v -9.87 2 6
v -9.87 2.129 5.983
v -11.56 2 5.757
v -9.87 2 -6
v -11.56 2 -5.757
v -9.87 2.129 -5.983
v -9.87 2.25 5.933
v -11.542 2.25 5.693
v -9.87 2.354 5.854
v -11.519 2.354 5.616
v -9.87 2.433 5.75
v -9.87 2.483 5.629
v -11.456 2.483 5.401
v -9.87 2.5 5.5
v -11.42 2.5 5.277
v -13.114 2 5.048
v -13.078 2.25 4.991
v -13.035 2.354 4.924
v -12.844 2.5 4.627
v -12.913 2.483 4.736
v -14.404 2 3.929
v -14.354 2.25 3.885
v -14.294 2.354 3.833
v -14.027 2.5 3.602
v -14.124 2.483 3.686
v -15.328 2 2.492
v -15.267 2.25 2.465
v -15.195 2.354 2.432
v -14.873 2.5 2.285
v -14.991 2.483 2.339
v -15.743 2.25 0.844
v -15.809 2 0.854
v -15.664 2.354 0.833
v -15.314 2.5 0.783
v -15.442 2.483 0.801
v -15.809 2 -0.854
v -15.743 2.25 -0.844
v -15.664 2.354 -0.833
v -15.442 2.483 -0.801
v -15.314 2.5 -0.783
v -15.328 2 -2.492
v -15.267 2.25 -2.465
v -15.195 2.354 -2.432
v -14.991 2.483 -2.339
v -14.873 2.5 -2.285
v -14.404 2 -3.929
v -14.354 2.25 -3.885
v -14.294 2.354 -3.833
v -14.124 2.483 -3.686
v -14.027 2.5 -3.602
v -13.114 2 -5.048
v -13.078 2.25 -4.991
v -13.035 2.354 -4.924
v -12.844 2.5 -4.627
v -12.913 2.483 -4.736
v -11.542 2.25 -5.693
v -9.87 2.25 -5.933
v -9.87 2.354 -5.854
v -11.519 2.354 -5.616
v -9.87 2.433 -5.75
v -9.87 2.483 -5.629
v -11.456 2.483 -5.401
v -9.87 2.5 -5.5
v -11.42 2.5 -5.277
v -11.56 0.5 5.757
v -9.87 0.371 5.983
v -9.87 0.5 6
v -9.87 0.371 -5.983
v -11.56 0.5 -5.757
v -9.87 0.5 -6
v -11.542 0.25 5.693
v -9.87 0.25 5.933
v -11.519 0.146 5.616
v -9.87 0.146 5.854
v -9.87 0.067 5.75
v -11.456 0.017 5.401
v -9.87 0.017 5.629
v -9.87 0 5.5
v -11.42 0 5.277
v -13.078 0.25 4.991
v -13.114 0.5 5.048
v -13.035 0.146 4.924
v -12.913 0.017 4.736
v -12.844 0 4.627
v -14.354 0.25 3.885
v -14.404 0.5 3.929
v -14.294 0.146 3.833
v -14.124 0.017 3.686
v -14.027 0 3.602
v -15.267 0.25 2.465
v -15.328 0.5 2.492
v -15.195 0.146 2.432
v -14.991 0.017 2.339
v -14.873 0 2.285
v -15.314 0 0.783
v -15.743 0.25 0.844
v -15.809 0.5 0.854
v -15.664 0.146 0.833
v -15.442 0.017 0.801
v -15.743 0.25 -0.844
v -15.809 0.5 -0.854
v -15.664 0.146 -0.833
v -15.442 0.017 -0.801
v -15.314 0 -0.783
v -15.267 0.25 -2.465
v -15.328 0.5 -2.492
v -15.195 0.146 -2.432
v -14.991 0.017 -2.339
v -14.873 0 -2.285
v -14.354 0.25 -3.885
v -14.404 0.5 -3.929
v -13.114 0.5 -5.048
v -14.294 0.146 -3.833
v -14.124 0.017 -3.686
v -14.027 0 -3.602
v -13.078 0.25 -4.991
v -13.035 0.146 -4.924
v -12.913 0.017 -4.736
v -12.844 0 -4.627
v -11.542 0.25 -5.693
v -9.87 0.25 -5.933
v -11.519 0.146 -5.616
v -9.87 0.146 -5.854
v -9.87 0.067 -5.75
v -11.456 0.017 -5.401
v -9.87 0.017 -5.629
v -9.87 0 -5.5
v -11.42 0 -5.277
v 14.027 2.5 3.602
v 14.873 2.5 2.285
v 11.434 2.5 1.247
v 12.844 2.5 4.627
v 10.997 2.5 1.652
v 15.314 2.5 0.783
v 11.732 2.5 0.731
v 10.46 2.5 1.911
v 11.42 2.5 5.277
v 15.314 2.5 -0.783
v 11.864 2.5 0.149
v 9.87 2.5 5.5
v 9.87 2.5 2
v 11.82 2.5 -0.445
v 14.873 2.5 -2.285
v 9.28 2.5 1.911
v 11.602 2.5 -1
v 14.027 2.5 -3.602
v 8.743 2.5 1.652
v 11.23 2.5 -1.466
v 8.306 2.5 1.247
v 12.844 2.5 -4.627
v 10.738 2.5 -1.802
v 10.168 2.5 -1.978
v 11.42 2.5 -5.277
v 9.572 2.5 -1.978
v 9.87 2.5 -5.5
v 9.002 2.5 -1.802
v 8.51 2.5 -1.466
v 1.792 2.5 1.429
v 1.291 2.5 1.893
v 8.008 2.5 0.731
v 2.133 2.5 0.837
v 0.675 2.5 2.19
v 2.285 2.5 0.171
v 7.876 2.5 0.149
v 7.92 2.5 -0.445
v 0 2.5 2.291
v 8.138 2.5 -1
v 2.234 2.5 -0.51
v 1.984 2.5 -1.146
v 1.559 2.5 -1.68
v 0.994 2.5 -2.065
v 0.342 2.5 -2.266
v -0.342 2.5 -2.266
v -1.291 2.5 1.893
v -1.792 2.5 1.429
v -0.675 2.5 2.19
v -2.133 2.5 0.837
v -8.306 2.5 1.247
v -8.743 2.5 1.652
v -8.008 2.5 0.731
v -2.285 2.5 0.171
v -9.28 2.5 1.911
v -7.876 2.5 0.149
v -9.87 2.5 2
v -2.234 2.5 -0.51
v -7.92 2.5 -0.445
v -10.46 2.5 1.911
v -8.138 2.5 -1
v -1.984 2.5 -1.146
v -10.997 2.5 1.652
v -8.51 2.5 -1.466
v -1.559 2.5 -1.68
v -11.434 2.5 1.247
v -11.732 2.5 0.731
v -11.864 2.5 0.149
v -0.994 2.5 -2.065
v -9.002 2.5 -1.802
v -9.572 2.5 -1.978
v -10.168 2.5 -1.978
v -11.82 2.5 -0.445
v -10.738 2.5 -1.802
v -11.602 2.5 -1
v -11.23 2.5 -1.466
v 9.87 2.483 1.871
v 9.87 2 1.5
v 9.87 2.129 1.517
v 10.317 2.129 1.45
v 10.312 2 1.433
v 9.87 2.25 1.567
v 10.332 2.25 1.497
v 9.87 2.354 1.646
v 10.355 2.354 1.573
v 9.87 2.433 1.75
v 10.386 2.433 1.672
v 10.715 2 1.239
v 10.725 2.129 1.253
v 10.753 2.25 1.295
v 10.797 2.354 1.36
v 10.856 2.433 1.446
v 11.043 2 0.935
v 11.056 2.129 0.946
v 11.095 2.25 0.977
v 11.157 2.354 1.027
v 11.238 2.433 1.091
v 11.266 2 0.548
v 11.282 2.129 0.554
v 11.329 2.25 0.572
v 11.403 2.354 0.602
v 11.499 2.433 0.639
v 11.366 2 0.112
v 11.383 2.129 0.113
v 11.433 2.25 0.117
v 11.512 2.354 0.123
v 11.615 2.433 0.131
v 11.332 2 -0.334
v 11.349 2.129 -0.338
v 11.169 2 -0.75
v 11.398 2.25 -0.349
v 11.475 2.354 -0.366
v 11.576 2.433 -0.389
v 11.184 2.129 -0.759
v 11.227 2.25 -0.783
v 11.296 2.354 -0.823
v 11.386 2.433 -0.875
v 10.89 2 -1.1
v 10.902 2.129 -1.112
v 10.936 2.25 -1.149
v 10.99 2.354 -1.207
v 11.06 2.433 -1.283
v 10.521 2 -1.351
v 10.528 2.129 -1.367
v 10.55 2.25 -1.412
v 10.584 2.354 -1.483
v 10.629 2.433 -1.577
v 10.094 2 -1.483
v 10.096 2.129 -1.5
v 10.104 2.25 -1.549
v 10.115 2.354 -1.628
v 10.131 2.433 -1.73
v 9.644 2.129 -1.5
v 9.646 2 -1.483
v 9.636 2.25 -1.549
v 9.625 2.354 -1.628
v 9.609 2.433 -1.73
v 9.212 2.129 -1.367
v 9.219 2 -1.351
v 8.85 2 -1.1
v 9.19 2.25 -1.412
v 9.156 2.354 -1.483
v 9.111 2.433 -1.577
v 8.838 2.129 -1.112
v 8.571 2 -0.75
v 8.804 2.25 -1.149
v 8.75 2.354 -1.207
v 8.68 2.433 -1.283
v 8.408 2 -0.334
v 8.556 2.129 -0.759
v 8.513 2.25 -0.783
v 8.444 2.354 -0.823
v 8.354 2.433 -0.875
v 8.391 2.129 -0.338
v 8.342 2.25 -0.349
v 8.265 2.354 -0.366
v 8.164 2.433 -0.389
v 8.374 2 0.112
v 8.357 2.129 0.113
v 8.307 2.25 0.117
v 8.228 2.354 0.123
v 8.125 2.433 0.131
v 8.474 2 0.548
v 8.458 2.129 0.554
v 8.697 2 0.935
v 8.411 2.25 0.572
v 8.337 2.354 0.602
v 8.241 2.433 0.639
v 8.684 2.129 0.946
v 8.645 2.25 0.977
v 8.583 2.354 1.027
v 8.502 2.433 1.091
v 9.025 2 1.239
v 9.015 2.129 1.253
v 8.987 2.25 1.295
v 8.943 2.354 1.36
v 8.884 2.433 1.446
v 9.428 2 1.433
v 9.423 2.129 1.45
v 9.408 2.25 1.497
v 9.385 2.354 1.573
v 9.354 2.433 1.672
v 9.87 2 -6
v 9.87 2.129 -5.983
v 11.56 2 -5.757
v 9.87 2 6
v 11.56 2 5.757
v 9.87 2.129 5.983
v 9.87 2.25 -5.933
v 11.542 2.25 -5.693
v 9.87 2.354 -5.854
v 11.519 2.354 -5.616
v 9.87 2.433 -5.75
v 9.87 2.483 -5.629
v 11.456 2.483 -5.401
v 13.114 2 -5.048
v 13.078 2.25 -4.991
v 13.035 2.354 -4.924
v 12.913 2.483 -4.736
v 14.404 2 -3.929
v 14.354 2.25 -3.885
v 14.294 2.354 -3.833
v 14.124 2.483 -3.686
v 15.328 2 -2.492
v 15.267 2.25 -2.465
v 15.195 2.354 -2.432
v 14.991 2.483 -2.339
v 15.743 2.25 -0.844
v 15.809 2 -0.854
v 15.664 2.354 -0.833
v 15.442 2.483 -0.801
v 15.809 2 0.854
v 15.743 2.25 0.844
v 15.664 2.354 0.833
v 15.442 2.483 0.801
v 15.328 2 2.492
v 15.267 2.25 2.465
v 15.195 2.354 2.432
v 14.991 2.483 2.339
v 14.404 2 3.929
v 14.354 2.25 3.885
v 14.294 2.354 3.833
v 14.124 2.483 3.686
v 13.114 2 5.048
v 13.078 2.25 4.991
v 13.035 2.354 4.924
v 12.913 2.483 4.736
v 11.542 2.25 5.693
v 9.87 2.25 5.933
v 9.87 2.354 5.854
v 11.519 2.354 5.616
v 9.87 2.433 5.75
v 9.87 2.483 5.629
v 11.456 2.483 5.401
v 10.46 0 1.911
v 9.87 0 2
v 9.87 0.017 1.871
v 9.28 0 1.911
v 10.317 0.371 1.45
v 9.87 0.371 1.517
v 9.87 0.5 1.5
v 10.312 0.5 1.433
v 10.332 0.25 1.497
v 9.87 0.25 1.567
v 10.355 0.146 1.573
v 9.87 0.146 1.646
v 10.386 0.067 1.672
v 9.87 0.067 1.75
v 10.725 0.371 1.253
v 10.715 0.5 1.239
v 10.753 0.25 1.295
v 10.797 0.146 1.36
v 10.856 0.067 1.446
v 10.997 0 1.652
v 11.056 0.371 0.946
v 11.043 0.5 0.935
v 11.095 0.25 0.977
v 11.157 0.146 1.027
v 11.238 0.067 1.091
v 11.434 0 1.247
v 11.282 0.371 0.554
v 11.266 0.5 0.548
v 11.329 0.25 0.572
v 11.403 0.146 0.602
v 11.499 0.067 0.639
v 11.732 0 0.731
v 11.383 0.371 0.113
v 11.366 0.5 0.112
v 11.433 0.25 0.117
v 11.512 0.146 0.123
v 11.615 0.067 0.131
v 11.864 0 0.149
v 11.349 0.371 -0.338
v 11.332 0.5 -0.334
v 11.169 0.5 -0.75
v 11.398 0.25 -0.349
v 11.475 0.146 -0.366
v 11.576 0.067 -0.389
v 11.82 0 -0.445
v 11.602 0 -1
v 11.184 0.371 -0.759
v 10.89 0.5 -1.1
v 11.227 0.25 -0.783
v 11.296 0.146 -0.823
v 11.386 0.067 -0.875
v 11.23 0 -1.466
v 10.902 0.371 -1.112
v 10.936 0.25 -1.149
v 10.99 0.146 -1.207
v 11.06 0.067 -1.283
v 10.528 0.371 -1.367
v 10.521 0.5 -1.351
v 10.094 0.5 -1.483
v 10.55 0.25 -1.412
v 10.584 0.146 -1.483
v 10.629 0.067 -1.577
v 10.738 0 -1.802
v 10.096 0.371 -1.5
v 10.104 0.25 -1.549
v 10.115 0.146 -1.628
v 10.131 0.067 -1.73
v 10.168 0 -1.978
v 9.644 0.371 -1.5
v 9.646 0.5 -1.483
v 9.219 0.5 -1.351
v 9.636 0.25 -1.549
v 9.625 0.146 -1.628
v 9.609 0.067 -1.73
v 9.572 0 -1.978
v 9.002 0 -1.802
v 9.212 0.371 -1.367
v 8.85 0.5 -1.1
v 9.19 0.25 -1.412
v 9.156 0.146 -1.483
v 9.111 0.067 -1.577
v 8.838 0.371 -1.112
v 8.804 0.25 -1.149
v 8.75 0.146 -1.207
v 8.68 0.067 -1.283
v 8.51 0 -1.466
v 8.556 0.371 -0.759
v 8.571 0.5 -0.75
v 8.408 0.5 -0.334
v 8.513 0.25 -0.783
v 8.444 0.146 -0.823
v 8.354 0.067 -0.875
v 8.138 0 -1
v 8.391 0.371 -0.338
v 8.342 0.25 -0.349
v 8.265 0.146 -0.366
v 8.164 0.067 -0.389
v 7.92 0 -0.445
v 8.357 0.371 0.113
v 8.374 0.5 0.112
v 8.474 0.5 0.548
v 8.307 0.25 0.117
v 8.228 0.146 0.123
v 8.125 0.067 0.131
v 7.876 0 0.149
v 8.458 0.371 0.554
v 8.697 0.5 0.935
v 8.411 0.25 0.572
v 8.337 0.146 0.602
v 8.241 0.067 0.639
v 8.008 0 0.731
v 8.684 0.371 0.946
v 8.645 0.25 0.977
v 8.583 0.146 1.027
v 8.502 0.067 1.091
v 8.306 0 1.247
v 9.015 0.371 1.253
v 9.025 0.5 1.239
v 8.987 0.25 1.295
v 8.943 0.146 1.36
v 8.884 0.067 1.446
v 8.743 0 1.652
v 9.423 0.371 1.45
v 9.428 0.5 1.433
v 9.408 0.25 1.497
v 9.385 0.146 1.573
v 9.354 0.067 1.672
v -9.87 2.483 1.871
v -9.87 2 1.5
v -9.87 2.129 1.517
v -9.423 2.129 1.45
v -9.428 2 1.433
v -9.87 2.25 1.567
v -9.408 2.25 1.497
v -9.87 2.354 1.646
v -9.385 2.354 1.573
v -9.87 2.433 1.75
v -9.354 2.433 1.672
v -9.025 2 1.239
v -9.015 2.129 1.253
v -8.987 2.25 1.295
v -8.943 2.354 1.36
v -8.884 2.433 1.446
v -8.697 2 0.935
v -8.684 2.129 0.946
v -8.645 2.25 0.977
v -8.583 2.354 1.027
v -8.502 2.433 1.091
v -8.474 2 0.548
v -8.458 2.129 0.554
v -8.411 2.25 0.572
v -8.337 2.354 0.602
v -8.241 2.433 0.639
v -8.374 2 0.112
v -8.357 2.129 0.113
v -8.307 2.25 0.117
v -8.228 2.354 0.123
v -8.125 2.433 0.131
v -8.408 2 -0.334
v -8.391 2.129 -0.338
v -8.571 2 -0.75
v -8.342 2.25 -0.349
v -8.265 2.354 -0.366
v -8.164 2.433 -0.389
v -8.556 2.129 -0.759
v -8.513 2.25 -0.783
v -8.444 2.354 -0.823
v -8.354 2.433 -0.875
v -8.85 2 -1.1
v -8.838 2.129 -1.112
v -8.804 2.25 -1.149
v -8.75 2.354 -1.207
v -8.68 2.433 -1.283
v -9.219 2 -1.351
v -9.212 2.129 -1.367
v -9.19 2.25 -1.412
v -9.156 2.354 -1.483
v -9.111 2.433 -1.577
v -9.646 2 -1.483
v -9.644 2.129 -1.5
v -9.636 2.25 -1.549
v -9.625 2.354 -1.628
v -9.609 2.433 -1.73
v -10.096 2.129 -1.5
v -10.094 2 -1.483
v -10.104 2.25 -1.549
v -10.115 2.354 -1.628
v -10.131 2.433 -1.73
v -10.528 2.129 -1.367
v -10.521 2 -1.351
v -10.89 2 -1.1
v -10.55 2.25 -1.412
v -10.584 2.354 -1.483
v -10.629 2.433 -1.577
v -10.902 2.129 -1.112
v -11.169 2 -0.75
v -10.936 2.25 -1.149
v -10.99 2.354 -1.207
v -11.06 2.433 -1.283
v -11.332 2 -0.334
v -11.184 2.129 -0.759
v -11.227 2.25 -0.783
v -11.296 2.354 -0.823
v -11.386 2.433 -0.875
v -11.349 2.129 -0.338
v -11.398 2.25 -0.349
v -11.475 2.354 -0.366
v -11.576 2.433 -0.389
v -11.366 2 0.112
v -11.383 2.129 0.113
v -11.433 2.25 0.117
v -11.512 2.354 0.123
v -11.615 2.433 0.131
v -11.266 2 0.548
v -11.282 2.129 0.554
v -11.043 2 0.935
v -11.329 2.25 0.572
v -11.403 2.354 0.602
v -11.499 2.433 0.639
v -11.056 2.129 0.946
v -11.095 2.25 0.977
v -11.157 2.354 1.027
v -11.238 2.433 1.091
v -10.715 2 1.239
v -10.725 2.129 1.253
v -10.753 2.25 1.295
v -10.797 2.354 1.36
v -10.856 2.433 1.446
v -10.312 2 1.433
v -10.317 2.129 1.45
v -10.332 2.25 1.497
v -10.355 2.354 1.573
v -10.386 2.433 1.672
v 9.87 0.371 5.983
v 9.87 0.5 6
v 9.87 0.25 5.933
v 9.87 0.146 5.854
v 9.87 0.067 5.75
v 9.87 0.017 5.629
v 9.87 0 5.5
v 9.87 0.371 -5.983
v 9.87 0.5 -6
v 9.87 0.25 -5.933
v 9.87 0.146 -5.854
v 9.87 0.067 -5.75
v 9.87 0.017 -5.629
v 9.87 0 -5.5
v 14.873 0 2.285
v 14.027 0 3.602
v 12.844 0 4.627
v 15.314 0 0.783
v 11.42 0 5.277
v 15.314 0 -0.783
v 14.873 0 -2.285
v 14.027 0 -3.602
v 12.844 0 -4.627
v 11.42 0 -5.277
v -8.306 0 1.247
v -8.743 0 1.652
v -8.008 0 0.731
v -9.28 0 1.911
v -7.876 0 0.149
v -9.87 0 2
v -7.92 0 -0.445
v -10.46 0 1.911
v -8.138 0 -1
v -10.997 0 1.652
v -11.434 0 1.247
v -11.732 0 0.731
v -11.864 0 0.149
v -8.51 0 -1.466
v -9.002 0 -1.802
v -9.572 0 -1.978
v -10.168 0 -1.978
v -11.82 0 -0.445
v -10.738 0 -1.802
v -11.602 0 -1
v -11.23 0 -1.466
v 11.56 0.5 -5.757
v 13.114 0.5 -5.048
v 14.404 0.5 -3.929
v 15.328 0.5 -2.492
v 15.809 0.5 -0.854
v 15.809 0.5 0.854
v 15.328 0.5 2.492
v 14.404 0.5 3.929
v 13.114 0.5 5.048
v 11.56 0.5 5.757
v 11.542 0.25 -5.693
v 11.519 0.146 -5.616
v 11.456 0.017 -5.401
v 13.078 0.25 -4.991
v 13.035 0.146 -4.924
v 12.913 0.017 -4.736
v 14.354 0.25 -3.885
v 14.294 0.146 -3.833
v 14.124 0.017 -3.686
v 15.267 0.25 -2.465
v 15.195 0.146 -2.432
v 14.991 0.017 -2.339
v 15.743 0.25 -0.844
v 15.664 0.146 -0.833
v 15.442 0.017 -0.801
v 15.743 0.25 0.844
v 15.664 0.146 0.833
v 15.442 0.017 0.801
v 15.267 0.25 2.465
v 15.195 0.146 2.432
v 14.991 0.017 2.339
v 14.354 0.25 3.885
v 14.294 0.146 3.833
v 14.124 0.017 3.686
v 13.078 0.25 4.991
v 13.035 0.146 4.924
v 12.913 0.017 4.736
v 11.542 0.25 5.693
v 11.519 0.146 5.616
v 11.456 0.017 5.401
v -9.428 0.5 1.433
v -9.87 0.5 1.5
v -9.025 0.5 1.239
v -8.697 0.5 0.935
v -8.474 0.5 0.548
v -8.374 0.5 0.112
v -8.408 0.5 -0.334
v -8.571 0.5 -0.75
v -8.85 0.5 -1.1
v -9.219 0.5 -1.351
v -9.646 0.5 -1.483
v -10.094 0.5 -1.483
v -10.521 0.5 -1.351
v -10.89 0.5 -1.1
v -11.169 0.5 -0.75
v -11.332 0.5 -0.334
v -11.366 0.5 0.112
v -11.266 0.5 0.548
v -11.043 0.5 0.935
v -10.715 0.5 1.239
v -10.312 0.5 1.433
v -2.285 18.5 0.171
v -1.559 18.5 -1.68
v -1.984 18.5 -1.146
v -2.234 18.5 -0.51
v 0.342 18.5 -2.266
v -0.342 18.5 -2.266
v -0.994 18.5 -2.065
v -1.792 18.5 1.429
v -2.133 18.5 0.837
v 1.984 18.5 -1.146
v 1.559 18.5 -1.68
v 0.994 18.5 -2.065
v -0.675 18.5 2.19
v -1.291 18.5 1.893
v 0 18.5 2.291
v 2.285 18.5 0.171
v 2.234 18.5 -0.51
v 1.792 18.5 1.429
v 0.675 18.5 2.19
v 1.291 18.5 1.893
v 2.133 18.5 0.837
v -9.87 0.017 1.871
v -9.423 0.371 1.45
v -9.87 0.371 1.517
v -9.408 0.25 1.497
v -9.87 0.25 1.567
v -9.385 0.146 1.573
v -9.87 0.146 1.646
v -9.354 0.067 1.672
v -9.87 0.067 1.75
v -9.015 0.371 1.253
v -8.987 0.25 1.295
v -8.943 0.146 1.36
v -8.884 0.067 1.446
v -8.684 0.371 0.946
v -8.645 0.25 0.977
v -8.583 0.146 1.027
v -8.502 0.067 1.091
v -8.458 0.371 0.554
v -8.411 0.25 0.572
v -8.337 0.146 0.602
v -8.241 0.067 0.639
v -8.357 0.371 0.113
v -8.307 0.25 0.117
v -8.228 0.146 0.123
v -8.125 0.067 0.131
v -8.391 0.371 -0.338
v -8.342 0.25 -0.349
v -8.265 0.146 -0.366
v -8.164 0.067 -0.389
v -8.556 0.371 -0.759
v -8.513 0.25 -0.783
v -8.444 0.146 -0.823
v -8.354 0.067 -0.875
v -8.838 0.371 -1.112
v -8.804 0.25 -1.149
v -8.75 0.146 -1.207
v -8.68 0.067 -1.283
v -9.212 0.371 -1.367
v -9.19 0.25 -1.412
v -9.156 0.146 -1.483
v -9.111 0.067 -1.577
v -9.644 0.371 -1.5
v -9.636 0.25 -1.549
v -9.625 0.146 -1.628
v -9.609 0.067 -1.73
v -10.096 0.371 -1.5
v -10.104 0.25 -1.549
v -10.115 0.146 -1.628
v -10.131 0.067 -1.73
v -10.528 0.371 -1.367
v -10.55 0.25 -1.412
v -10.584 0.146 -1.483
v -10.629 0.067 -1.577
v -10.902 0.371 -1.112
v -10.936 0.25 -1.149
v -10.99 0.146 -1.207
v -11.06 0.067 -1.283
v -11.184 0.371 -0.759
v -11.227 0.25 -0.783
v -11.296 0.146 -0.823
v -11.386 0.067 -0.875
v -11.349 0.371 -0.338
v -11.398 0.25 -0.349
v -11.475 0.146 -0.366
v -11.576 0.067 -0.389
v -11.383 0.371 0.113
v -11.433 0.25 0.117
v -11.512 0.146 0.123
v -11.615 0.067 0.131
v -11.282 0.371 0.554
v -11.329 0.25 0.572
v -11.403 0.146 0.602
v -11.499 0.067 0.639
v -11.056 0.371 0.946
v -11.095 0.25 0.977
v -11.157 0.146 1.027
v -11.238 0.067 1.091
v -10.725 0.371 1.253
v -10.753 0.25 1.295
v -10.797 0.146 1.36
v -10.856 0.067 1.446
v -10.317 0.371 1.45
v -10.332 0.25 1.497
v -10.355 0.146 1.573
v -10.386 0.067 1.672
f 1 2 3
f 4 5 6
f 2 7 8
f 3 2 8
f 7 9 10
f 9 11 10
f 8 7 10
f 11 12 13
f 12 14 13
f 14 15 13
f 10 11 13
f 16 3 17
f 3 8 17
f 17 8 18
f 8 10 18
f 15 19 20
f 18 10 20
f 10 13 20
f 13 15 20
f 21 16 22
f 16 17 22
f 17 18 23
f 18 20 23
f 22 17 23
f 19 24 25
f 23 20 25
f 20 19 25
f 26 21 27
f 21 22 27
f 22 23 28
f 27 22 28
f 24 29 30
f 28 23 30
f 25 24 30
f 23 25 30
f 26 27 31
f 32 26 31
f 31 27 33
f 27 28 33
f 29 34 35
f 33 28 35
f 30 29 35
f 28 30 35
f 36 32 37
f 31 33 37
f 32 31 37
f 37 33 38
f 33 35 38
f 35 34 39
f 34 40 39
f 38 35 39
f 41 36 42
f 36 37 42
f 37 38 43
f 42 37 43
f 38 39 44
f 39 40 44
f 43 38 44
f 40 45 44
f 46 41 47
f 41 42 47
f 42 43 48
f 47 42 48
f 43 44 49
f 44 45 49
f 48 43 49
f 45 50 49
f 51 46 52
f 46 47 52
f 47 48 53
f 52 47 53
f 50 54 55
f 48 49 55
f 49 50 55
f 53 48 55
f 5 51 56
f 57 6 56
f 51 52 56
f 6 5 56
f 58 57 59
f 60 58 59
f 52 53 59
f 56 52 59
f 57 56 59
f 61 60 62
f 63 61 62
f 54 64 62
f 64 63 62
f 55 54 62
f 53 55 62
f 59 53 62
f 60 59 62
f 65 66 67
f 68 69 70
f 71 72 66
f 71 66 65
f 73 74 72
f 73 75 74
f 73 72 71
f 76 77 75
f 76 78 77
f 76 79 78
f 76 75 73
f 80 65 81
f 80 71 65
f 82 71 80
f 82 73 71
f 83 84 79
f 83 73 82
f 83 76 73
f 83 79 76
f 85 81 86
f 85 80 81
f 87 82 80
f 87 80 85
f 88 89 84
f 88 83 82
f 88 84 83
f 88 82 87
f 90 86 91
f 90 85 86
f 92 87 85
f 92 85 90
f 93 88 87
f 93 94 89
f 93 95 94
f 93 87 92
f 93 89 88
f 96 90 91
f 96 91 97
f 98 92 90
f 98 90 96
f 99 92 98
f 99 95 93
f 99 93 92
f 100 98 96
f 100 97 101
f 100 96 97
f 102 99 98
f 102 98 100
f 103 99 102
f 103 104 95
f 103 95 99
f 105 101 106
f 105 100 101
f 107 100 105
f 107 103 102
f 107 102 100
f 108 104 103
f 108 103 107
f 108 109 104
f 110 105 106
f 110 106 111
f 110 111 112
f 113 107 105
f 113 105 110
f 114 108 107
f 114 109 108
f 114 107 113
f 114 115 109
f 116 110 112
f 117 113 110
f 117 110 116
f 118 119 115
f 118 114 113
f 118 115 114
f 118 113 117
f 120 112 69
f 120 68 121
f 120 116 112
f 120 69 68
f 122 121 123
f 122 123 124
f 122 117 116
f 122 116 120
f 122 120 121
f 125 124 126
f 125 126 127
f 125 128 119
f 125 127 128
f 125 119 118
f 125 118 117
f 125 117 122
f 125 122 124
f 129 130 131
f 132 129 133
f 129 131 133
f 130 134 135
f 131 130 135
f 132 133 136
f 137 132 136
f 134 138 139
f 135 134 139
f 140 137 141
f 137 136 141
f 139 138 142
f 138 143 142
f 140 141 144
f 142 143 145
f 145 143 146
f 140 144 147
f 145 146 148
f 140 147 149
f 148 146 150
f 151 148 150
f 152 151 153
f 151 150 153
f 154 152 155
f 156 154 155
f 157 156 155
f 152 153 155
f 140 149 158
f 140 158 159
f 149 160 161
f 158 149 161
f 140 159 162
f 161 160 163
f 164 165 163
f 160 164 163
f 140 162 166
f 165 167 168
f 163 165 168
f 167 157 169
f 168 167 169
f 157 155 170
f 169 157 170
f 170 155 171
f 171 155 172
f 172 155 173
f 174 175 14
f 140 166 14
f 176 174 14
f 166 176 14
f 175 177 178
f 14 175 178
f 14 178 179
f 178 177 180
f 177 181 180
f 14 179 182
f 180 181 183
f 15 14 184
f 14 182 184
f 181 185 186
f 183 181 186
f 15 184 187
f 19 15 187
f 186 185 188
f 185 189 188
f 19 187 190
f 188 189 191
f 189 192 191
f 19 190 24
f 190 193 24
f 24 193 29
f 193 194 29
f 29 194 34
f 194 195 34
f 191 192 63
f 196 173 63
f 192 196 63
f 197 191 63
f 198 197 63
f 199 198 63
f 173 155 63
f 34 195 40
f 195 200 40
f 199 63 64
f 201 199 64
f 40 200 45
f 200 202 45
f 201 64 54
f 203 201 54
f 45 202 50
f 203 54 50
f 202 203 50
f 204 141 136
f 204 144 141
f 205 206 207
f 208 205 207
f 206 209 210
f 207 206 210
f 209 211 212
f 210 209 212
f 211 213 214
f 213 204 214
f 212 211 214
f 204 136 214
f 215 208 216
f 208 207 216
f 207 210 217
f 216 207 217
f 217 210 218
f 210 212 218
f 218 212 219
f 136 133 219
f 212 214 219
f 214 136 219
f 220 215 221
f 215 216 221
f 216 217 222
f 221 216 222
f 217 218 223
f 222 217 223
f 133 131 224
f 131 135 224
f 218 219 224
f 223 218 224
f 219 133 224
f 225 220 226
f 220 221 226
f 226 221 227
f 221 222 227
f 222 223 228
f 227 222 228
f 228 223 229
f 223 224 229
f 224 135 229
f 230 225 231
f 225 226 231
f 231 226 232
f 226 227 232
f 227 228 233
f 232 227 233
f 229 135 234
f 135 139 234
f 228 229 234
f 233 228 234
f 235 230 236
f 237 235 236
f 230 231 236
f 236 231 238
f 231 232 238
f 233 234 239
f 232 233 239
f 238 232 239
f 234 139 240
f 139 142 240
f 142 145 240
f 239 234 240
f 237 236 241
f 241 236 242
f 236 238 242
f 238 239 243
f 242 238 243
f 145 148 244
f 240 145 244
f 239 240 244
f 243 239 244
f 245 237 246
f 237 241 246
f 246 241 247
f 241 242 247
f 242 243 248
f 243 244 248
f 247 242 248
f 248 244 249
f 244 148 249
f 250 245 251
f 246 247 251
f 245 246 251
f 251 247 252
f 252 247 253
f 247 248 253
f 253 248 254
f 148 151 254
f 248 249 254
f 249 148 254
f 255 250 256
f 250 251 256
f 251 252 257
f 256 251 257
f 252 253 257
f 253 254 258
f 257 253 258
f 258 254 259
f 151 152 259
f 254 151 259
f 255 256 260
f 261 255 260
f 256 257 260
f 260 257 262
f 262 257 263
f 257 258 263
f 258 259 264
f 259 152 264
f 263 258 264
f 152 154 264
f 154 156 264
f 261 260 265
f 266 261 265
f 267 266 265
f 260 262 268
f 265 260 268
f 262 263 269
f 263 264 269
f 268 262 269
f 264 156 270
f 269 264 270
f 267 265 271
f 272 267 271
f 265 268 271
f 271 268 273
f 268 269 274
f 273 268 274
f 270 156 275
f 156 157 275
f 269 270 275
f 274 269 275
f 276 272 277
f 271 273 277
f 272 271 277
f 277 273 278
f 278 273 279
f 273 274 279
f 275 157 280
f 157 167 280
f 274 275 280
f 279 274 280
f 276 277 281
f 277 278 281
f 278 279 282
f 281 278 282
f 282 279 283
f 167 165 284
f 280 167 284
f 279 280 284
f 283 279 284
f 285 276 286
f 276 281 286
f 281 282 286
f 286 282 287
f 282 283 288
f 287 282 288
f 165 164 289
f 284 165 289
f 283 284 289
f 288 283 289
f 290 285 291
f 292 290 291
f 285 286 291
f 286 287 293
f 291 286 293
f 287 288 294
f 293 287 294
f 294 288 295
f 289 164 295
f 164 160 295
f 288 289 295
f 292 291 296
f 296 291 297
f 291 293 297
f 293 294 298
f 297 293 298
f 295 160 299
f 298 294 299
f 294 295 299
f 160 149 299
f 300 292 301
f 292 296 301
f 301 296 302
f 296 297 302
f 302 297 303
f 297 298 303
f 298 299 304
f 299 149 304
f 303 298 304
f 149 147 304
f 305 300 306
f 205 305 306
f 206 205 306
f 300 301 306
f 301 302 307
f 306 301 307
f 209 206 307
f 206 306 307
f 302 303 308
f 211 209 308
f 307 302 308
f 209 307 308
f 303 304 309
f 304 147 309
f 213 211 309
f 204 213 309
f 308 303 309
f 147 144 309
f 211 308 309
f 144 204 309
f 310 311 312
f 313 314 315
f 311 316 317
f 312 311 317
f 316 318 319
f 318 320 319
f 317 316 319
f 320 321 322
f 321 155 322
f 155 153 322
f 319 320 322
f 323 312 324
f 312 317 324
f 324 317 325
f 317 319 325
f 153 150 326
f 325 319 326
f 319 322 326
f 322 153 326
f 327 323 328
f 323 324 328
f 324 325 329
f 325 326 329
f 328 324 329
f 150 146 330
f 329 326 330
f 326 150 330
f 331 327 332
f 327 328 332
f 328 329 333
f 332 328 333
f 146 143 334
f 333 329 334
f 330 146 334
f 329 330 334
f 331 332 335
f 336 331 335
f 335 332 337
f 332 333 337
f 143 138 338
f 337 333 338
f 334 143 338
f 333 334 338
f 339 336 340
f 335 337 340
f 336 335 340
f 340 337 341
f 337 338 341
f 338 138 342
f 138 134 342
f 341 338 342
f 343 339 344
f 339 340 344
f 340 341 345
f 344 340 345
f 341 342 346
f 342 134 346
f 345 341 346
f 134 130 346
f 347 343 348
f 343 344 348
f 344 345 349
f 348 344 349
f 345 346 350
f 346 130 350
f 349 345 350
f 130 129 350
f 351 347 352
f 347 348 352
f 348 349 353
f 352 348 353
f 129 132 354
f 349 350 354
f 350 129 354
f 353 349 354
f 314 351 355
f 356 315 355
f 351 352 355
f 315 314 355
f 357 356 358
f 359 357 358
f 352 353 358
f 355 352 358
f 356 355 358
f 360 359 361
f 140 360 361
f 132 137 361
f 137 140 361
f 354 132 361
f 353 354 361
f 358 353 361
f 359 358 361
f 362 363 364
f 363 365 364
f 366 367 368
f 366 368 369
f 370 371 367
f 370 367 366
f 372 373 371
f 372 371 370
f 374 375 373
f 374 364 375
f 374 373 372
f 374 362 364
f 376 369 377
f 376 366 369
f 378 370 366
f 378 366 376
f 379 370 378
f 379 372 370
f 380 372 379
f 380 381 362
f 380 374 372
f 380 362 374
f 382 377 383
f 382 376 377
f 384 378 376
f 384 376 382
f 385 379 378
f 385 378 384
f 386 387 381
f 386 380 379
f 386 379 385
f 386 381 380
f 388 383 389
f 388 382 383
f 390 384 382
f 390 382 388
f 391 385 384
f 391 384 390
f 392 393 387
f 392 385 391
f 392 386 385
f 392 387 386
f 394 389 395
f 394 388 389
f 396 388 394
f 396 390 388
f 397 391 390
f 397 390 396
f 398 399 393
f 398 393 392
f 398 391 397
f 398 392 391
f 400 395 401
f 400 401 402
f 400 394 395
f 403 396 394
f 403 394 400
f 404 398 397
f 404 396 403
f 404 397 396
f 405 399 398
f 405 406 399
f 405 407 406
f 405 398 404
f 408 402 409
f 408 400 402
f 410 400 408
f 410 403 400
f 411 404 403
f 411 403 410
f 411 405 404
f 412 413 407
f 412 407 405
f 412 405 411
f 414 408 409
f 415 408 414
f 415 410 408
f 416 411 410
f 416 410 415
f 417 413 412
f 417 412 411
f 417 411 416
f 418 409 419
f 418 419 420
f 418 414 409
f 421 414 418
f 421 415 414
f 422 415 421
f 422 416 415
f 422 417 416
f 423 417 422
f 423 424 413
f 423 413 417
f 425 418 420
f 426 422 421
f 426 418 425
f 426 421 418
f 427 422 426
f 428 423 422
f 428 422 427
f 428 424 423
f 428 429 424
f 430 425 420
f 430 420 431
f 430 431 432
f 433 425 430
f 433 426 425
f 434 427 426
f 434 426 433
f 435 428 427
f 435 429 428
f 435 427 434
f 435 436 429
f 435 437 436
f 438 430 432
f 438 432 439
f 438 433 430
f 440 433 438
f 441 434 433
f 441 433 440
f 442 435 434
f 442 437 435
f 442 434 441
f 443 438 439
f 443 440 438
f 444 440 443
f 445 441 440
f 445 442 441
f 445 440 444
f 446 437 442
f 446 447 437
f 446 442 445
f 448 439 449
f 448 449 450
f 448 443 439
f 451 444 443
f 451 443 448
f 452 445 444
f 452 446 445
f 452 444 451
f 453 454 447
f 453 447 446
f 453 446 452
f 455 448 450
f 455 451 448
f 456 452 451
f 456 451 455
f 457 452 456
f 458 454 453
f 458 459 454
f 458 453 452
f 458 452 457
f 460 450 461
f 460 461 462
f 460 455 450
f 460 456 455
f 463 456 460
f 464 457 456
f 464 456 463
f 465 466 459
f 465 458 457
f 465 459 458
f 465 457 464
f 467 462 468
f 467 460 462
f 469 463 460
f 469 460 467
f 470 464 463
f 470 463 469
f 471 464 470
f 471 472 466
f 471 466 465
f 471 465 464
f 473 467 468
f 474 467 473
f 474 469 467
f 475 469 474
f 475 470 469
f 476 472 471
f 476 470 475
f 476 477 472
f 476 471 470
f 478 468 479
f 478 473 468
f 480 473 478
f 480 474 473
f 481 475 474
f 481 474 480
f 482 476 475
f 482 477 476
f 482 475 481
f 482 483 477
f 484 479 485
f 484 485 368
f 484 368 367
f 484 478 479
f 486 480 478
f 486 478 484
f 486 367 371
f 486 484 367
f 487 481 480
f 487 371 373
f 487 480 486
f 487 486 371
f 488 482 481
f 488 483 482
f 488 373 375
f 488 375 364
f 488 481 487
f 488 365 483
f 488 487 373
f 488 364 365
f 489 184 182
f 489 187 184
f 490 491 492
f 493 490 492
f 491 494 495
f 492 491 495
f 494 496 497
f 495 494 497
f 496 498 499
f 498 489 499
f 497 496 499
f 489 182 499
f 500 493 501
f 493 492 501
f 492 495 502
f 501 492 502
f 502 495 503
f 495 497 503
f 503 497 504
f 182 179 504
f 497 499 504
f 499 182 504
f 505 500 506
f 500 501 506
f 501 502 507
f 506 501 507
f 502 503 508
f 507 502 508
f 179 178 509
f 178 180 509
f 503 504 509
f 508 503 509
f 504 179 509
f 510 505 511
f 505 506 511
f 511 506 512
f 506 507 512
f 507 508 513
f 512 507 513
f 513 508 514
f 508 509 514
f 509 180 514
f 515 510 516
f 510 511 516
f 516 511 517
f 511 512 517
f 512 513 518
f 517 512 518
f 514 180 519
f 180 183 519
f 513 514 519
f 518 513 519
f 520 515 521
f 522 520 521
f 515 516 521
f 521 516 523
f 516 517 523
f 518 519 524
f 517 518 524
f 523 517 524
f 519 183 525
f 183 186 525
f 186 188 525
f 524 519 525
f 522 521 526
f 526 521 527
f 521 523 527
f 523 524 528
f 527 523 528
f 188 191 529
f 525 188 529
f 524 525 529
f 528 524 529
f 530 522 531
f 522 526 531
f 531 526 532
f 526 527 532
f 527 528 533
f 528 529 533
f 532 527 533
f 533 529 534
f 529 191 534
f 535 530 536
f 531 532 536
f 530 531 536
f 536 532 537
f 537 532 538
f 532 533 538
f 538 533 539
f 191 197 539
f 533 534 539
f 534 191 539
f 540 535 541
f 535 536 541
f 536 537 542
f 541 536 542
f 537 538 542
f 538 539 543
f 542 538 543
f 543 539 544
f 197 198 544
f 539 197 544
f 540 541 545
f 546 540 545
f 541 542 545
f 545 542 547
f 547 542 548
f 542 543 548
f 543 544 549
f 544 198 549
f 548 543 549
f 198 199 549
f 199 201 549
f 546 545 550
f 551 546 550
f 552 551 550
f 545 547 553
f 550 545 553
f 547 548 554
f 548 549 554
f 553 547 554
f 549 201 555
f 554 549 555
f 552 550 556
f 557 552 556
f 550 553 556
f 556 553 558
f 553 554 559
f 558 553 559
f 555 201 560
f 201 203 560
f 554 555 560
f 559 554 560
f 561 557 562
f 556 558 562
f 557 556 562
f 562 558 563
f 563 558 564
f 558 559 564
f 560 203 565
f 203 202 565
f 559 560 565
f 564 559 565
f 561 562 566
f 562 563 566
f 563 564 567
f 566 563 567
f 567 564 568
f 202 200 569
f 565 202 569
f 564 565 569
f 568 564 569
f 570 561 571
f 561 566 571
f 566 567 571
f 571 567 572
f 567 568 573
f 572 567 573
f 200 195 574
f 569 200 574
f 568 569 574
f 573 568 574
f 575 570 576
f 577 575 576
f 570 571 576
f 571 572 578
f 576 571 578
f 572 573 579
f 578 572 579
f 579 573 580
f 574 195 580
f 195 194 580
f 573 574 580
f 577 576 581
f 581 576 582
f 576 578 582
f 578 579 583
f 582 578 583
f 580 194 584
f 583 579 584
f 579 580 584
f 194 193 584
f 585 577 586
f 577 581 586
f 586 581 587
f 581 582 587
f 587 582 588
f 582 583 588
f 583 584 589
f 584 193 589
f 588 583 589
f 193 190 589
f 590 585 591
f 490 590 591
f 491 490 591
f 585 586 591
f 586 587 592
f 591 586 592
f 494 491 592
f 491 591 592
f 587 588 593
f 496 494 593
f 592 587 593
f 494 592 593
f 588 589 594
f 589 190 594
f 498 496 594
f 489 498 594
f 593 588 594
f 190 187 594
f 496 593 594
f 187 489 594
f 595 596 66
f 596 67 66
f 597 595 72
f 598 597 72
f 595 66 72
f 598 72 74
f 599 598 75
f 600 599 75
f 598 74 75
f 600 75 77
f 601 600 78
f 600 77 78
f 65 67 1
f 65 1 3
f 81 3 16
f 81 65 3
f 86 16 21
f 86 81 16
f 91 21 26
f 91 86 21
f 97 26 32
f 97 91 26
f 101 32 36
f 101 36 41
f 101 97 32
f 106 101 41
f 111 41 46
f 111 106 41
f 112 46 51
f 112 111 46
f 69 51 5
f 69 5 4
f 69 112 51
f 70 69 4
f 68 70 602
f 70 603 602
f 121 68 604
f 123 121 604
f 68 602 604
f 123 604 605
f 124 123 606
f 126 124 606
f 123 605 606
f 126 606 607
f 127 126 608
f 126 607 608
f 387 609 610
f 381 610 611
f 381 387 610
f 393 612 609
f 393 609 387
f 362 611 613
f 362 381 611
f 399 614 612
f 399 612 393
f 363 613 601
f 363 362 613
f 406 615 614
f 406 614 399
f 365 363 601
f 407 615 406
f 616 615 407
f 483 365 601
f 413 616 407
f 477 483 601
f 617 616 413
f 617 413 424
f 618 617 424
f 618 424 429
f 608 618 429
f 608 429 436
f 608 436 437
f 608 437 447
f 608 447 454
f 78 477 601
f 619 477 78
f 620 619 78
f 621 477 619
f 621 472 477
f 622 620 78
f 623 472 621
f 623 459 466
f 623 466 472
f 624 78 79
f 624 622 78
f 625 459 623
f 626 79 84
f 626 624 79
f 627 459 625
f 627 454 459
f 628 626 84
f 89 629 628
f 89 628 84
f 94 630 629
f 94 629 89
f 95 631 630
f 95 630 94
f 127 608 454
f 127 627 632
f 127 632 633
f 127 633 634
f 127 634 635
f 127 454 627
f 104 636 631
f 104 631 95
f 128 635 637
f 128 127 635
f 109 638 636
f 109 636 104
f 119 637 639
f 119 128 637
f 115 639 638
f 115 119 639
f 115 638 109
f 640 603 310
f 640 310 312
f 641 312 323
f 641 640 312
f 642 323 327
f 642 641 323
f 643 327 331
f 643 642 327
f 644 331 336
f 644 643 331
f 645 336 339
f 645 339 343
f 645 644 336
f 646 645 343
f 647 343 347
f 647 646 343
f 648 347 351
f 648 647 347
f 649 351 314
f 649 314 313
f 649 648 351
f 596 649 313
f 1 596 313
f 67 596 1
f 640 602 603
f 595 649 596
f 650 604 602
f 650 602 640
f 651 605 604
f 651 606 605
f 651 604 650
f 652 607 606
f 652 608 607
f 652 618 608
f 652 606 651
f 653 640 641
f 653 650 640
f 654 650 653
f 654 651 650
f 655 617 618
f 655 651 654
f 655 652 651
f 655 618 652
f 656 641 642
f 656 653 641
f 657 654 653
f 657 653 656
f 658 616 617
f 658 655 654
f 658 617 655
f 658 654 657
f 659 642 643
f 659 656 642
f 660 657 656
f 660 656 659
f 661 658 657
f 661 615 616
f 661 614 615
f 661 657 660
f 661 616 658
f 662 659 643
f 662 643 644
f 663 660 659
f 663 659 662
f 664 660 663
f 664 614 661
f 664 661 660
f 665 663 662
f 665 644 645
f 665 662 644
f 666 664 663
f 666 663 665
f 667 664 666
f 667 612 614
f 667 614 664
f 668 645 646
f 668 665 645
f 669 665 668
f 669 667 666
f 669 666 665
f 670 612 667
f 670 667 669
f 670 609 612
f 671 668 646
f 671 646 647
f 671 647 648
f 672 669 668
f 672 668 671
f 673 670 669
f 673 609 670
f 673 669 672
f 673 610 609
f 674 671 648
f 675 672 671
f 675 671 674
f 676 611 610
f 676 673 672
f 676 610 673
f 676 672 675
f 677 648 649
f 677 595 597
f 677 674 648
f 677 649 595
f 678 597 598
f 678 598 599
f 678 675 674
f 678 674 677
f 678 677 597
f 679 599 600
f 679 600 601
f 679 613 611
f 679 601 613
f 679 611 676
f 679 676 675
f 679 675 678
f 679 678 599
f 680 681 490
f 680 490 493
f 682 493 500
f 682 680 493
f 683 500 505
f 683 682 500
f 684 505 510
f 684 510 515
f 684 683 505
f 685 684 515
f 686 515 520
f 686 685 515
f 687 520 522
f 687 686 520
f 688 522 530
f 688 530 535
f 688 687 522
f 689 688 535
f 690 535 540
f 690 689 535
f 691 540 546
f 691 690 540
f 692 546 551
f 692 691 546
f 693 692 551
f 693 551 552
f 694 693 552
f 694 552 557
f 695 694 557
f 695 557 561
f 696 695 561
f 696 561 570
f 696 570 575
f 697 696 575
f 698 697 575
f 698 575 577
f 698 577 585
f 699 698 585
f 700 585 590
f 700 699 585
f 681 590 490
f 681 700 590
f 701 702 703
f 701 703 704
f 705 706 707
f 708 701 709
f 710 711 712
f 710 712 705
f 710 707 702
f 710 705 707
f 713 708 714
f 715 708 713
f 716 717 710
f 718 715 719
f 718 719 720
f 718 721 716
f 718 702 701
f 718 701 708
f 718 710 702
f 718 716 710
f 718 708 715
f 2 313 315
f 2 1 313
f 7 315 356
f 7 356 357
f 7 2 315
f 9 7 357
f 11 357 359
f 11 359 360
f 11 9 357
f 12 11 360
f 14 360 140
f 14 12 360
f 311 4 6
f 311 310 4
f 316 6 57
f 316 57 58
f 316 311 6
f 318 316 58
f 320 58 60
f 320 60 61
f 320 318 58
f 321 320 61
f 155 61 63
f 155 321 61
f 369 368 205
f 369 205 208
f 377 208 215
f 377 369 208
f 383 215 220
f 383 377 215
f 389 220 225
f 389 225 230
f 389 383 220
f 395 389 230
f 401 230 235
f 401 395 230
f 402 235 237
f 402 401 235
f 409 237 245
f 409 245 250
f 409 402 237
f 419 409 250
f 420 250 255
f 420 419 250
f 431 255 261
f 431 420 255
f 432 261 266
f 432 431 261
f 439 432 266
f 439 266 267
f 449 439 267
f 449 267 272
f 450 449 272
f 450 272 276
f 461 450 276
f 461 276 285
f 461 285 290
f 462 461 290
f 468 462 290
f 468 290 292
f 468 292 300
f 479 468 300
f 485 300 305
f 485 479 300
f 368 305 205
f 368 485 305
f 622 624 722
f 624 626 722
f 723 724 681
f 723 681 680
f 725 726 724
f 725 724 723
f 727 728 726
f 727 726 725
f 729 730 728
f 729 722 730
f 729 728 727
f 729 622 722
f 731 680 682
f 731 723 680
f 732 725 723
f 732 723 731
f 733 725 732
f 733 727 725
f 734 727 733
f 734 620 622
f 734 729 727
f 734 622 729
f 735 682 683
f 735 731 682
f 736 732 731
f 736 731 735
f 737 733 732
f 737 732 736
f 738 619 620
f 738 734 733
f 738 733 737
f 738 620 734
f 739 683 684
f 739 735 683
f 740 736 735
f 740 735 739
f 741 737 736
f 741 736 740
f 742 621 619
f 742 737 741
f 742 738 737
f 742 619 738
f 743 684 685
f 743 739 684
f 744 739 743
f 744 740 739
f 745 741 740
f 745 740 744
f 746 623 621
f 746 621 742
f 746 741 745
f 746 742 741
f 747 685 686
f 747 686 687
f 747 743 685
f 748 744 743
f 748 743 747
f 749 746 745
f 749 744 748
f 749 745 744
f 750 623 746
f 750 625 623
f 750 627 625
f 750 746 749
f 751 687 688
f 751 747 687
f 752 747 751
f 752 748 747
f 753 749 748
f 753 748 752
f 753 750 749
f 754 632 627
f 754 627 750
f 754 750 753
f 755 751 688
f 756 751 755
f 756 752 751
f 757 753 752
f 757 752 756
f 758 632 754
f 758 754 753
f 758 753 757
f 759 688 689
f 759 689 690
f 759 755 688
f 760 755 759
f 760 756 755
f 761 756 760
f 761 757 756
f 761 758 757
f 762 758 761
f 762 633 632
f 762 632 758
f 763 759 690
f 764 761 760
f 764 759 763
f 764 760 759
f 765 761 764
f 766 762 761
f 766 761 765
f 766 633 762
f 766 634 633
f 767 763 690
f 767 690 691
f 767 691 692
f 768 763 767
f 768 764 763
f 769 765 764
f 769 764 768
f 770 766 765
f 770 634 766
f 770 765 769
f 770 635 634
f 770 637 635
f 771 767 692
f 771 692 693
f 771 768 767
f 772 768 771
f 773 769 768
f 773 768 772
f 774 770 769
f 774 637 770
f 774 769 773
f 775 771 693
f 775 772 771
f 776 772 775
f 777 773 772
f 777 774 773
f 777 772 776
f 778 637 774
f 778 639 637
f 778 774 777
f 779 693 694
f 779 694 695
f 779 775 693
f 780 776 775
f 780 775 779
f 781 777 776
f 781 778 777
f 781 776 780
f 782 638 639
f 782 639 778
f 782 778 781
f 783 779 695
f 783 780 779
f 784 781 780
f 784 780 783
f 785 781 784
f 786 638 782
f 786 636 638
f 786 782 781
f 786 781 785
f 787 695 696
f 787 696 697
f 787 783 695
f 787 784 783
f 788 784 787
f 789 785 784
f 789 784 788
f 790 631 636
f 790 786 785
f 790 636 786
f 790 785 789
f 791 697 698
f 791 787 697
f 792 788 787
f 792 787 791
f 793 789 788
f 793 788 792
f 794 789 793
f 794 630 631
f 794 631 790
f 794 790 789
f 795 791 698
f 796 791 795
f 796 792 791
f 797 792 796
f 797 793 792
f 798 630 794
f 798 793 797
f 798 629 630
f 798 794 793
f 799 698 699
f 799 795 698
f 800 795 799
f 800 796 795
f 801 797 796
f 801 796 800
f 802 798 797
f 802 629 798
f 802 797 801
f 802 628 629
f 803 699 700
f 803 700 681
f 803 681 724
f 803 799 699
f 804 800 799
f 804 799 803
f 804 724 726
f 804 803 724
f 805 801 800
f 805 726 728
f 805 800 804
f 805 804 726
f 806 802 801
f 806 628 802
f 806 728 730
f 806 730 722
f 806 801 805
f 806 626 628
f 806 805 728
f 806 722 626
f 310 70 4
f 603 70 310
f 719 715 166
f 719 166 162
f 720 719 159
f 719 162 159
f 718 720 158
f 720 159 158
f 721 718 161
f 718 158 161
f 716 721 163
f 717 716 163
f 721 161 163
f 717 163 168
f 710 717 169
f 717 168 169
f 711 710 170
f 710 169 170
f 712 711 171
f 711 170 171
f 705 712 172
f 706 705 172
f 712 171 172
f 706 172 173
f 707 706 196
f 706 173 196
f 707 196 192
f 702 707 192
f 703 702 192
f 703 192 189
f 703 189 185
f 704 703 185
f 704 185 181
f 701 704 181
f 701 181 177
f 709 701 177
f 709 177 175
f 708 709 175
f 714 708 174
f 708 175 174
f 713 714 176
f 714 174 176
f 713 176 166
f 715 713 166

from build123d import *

# Parameters (mm, degrees)
SKETCH1_R           = 1.5
BOSS_EXTRUDE1_DEPTH = 2.5
FILLET1_R           = 0.5
SKETCH2_R           = 2.29148448
BOSS_EXTRUDE2_DEPTH = 16


with BuildPart() as part:
    # Sketch1 → Boss-Extrude1 (new body)
    with BuildSketch(Plane(origin=(0, 0, 0), x_dir=(1, 0, 0), z_dir=(0, 1, 0))):
        with BuildLine():
            Line((-9.87, 6), (9.87, 6))
            ThreePointArc((9.87, 6), (15.87, 0), (9.87, -6))
            Line((9.87, -6), (-9.87, -6))
            ThreePointArc((-9.87, -6), (-15.87, 0), (-9.87, 6))
        make_face()
        with Locations(Location((-9.87, 0, 0), (0, 0, 270))):
            Circle(SKETCH1_R, mode=Mode.SUBTRACT)
        with Locations(Location((9.87, 0, 0), (0, 0, 270))):
            Circle(SKETCH1_R, mode=Mode.SUBTRACT)
    extrude(amount=BOSS_EXTRUDE1_DEPTH)

    # Fillet1
    fillet1_edges = [part.edges().sort_by_distance(p)[0] for p in [
        (-9.87, 0, -1.5),
        (-9.87, 2.5, -1.5),
        (15.87, 2.5, 0),
        (9.87, 0, -1.5),
        (9.87, 2.5, -1.5),
        (0, 2.5, -6),
        (-15.87, 2.5, 0),
        (0, 0, -6),
        (15.87, 0, 0),
        (0, 0, 6),
        (-15.87, 0, 0),
        (0, 2.5, 6),
    ]]
    fillet(fillet1_edges, radius=FILLET1_R)

    # Sketch2 → Boss-Extrude2 (add)
    with BuildSketch(Plane(origin=(0, 2.5, 0), x_dir=(1, 0, 0), z_dir=(0, 1, 0))):
        with Locations(Location((0, 0, 0), (0, 0, 270))):
            Circle(SKETCH2_R)
    extrude(amount=BOSS_EXTRUDE2_DEPTH)


solid = part.part
